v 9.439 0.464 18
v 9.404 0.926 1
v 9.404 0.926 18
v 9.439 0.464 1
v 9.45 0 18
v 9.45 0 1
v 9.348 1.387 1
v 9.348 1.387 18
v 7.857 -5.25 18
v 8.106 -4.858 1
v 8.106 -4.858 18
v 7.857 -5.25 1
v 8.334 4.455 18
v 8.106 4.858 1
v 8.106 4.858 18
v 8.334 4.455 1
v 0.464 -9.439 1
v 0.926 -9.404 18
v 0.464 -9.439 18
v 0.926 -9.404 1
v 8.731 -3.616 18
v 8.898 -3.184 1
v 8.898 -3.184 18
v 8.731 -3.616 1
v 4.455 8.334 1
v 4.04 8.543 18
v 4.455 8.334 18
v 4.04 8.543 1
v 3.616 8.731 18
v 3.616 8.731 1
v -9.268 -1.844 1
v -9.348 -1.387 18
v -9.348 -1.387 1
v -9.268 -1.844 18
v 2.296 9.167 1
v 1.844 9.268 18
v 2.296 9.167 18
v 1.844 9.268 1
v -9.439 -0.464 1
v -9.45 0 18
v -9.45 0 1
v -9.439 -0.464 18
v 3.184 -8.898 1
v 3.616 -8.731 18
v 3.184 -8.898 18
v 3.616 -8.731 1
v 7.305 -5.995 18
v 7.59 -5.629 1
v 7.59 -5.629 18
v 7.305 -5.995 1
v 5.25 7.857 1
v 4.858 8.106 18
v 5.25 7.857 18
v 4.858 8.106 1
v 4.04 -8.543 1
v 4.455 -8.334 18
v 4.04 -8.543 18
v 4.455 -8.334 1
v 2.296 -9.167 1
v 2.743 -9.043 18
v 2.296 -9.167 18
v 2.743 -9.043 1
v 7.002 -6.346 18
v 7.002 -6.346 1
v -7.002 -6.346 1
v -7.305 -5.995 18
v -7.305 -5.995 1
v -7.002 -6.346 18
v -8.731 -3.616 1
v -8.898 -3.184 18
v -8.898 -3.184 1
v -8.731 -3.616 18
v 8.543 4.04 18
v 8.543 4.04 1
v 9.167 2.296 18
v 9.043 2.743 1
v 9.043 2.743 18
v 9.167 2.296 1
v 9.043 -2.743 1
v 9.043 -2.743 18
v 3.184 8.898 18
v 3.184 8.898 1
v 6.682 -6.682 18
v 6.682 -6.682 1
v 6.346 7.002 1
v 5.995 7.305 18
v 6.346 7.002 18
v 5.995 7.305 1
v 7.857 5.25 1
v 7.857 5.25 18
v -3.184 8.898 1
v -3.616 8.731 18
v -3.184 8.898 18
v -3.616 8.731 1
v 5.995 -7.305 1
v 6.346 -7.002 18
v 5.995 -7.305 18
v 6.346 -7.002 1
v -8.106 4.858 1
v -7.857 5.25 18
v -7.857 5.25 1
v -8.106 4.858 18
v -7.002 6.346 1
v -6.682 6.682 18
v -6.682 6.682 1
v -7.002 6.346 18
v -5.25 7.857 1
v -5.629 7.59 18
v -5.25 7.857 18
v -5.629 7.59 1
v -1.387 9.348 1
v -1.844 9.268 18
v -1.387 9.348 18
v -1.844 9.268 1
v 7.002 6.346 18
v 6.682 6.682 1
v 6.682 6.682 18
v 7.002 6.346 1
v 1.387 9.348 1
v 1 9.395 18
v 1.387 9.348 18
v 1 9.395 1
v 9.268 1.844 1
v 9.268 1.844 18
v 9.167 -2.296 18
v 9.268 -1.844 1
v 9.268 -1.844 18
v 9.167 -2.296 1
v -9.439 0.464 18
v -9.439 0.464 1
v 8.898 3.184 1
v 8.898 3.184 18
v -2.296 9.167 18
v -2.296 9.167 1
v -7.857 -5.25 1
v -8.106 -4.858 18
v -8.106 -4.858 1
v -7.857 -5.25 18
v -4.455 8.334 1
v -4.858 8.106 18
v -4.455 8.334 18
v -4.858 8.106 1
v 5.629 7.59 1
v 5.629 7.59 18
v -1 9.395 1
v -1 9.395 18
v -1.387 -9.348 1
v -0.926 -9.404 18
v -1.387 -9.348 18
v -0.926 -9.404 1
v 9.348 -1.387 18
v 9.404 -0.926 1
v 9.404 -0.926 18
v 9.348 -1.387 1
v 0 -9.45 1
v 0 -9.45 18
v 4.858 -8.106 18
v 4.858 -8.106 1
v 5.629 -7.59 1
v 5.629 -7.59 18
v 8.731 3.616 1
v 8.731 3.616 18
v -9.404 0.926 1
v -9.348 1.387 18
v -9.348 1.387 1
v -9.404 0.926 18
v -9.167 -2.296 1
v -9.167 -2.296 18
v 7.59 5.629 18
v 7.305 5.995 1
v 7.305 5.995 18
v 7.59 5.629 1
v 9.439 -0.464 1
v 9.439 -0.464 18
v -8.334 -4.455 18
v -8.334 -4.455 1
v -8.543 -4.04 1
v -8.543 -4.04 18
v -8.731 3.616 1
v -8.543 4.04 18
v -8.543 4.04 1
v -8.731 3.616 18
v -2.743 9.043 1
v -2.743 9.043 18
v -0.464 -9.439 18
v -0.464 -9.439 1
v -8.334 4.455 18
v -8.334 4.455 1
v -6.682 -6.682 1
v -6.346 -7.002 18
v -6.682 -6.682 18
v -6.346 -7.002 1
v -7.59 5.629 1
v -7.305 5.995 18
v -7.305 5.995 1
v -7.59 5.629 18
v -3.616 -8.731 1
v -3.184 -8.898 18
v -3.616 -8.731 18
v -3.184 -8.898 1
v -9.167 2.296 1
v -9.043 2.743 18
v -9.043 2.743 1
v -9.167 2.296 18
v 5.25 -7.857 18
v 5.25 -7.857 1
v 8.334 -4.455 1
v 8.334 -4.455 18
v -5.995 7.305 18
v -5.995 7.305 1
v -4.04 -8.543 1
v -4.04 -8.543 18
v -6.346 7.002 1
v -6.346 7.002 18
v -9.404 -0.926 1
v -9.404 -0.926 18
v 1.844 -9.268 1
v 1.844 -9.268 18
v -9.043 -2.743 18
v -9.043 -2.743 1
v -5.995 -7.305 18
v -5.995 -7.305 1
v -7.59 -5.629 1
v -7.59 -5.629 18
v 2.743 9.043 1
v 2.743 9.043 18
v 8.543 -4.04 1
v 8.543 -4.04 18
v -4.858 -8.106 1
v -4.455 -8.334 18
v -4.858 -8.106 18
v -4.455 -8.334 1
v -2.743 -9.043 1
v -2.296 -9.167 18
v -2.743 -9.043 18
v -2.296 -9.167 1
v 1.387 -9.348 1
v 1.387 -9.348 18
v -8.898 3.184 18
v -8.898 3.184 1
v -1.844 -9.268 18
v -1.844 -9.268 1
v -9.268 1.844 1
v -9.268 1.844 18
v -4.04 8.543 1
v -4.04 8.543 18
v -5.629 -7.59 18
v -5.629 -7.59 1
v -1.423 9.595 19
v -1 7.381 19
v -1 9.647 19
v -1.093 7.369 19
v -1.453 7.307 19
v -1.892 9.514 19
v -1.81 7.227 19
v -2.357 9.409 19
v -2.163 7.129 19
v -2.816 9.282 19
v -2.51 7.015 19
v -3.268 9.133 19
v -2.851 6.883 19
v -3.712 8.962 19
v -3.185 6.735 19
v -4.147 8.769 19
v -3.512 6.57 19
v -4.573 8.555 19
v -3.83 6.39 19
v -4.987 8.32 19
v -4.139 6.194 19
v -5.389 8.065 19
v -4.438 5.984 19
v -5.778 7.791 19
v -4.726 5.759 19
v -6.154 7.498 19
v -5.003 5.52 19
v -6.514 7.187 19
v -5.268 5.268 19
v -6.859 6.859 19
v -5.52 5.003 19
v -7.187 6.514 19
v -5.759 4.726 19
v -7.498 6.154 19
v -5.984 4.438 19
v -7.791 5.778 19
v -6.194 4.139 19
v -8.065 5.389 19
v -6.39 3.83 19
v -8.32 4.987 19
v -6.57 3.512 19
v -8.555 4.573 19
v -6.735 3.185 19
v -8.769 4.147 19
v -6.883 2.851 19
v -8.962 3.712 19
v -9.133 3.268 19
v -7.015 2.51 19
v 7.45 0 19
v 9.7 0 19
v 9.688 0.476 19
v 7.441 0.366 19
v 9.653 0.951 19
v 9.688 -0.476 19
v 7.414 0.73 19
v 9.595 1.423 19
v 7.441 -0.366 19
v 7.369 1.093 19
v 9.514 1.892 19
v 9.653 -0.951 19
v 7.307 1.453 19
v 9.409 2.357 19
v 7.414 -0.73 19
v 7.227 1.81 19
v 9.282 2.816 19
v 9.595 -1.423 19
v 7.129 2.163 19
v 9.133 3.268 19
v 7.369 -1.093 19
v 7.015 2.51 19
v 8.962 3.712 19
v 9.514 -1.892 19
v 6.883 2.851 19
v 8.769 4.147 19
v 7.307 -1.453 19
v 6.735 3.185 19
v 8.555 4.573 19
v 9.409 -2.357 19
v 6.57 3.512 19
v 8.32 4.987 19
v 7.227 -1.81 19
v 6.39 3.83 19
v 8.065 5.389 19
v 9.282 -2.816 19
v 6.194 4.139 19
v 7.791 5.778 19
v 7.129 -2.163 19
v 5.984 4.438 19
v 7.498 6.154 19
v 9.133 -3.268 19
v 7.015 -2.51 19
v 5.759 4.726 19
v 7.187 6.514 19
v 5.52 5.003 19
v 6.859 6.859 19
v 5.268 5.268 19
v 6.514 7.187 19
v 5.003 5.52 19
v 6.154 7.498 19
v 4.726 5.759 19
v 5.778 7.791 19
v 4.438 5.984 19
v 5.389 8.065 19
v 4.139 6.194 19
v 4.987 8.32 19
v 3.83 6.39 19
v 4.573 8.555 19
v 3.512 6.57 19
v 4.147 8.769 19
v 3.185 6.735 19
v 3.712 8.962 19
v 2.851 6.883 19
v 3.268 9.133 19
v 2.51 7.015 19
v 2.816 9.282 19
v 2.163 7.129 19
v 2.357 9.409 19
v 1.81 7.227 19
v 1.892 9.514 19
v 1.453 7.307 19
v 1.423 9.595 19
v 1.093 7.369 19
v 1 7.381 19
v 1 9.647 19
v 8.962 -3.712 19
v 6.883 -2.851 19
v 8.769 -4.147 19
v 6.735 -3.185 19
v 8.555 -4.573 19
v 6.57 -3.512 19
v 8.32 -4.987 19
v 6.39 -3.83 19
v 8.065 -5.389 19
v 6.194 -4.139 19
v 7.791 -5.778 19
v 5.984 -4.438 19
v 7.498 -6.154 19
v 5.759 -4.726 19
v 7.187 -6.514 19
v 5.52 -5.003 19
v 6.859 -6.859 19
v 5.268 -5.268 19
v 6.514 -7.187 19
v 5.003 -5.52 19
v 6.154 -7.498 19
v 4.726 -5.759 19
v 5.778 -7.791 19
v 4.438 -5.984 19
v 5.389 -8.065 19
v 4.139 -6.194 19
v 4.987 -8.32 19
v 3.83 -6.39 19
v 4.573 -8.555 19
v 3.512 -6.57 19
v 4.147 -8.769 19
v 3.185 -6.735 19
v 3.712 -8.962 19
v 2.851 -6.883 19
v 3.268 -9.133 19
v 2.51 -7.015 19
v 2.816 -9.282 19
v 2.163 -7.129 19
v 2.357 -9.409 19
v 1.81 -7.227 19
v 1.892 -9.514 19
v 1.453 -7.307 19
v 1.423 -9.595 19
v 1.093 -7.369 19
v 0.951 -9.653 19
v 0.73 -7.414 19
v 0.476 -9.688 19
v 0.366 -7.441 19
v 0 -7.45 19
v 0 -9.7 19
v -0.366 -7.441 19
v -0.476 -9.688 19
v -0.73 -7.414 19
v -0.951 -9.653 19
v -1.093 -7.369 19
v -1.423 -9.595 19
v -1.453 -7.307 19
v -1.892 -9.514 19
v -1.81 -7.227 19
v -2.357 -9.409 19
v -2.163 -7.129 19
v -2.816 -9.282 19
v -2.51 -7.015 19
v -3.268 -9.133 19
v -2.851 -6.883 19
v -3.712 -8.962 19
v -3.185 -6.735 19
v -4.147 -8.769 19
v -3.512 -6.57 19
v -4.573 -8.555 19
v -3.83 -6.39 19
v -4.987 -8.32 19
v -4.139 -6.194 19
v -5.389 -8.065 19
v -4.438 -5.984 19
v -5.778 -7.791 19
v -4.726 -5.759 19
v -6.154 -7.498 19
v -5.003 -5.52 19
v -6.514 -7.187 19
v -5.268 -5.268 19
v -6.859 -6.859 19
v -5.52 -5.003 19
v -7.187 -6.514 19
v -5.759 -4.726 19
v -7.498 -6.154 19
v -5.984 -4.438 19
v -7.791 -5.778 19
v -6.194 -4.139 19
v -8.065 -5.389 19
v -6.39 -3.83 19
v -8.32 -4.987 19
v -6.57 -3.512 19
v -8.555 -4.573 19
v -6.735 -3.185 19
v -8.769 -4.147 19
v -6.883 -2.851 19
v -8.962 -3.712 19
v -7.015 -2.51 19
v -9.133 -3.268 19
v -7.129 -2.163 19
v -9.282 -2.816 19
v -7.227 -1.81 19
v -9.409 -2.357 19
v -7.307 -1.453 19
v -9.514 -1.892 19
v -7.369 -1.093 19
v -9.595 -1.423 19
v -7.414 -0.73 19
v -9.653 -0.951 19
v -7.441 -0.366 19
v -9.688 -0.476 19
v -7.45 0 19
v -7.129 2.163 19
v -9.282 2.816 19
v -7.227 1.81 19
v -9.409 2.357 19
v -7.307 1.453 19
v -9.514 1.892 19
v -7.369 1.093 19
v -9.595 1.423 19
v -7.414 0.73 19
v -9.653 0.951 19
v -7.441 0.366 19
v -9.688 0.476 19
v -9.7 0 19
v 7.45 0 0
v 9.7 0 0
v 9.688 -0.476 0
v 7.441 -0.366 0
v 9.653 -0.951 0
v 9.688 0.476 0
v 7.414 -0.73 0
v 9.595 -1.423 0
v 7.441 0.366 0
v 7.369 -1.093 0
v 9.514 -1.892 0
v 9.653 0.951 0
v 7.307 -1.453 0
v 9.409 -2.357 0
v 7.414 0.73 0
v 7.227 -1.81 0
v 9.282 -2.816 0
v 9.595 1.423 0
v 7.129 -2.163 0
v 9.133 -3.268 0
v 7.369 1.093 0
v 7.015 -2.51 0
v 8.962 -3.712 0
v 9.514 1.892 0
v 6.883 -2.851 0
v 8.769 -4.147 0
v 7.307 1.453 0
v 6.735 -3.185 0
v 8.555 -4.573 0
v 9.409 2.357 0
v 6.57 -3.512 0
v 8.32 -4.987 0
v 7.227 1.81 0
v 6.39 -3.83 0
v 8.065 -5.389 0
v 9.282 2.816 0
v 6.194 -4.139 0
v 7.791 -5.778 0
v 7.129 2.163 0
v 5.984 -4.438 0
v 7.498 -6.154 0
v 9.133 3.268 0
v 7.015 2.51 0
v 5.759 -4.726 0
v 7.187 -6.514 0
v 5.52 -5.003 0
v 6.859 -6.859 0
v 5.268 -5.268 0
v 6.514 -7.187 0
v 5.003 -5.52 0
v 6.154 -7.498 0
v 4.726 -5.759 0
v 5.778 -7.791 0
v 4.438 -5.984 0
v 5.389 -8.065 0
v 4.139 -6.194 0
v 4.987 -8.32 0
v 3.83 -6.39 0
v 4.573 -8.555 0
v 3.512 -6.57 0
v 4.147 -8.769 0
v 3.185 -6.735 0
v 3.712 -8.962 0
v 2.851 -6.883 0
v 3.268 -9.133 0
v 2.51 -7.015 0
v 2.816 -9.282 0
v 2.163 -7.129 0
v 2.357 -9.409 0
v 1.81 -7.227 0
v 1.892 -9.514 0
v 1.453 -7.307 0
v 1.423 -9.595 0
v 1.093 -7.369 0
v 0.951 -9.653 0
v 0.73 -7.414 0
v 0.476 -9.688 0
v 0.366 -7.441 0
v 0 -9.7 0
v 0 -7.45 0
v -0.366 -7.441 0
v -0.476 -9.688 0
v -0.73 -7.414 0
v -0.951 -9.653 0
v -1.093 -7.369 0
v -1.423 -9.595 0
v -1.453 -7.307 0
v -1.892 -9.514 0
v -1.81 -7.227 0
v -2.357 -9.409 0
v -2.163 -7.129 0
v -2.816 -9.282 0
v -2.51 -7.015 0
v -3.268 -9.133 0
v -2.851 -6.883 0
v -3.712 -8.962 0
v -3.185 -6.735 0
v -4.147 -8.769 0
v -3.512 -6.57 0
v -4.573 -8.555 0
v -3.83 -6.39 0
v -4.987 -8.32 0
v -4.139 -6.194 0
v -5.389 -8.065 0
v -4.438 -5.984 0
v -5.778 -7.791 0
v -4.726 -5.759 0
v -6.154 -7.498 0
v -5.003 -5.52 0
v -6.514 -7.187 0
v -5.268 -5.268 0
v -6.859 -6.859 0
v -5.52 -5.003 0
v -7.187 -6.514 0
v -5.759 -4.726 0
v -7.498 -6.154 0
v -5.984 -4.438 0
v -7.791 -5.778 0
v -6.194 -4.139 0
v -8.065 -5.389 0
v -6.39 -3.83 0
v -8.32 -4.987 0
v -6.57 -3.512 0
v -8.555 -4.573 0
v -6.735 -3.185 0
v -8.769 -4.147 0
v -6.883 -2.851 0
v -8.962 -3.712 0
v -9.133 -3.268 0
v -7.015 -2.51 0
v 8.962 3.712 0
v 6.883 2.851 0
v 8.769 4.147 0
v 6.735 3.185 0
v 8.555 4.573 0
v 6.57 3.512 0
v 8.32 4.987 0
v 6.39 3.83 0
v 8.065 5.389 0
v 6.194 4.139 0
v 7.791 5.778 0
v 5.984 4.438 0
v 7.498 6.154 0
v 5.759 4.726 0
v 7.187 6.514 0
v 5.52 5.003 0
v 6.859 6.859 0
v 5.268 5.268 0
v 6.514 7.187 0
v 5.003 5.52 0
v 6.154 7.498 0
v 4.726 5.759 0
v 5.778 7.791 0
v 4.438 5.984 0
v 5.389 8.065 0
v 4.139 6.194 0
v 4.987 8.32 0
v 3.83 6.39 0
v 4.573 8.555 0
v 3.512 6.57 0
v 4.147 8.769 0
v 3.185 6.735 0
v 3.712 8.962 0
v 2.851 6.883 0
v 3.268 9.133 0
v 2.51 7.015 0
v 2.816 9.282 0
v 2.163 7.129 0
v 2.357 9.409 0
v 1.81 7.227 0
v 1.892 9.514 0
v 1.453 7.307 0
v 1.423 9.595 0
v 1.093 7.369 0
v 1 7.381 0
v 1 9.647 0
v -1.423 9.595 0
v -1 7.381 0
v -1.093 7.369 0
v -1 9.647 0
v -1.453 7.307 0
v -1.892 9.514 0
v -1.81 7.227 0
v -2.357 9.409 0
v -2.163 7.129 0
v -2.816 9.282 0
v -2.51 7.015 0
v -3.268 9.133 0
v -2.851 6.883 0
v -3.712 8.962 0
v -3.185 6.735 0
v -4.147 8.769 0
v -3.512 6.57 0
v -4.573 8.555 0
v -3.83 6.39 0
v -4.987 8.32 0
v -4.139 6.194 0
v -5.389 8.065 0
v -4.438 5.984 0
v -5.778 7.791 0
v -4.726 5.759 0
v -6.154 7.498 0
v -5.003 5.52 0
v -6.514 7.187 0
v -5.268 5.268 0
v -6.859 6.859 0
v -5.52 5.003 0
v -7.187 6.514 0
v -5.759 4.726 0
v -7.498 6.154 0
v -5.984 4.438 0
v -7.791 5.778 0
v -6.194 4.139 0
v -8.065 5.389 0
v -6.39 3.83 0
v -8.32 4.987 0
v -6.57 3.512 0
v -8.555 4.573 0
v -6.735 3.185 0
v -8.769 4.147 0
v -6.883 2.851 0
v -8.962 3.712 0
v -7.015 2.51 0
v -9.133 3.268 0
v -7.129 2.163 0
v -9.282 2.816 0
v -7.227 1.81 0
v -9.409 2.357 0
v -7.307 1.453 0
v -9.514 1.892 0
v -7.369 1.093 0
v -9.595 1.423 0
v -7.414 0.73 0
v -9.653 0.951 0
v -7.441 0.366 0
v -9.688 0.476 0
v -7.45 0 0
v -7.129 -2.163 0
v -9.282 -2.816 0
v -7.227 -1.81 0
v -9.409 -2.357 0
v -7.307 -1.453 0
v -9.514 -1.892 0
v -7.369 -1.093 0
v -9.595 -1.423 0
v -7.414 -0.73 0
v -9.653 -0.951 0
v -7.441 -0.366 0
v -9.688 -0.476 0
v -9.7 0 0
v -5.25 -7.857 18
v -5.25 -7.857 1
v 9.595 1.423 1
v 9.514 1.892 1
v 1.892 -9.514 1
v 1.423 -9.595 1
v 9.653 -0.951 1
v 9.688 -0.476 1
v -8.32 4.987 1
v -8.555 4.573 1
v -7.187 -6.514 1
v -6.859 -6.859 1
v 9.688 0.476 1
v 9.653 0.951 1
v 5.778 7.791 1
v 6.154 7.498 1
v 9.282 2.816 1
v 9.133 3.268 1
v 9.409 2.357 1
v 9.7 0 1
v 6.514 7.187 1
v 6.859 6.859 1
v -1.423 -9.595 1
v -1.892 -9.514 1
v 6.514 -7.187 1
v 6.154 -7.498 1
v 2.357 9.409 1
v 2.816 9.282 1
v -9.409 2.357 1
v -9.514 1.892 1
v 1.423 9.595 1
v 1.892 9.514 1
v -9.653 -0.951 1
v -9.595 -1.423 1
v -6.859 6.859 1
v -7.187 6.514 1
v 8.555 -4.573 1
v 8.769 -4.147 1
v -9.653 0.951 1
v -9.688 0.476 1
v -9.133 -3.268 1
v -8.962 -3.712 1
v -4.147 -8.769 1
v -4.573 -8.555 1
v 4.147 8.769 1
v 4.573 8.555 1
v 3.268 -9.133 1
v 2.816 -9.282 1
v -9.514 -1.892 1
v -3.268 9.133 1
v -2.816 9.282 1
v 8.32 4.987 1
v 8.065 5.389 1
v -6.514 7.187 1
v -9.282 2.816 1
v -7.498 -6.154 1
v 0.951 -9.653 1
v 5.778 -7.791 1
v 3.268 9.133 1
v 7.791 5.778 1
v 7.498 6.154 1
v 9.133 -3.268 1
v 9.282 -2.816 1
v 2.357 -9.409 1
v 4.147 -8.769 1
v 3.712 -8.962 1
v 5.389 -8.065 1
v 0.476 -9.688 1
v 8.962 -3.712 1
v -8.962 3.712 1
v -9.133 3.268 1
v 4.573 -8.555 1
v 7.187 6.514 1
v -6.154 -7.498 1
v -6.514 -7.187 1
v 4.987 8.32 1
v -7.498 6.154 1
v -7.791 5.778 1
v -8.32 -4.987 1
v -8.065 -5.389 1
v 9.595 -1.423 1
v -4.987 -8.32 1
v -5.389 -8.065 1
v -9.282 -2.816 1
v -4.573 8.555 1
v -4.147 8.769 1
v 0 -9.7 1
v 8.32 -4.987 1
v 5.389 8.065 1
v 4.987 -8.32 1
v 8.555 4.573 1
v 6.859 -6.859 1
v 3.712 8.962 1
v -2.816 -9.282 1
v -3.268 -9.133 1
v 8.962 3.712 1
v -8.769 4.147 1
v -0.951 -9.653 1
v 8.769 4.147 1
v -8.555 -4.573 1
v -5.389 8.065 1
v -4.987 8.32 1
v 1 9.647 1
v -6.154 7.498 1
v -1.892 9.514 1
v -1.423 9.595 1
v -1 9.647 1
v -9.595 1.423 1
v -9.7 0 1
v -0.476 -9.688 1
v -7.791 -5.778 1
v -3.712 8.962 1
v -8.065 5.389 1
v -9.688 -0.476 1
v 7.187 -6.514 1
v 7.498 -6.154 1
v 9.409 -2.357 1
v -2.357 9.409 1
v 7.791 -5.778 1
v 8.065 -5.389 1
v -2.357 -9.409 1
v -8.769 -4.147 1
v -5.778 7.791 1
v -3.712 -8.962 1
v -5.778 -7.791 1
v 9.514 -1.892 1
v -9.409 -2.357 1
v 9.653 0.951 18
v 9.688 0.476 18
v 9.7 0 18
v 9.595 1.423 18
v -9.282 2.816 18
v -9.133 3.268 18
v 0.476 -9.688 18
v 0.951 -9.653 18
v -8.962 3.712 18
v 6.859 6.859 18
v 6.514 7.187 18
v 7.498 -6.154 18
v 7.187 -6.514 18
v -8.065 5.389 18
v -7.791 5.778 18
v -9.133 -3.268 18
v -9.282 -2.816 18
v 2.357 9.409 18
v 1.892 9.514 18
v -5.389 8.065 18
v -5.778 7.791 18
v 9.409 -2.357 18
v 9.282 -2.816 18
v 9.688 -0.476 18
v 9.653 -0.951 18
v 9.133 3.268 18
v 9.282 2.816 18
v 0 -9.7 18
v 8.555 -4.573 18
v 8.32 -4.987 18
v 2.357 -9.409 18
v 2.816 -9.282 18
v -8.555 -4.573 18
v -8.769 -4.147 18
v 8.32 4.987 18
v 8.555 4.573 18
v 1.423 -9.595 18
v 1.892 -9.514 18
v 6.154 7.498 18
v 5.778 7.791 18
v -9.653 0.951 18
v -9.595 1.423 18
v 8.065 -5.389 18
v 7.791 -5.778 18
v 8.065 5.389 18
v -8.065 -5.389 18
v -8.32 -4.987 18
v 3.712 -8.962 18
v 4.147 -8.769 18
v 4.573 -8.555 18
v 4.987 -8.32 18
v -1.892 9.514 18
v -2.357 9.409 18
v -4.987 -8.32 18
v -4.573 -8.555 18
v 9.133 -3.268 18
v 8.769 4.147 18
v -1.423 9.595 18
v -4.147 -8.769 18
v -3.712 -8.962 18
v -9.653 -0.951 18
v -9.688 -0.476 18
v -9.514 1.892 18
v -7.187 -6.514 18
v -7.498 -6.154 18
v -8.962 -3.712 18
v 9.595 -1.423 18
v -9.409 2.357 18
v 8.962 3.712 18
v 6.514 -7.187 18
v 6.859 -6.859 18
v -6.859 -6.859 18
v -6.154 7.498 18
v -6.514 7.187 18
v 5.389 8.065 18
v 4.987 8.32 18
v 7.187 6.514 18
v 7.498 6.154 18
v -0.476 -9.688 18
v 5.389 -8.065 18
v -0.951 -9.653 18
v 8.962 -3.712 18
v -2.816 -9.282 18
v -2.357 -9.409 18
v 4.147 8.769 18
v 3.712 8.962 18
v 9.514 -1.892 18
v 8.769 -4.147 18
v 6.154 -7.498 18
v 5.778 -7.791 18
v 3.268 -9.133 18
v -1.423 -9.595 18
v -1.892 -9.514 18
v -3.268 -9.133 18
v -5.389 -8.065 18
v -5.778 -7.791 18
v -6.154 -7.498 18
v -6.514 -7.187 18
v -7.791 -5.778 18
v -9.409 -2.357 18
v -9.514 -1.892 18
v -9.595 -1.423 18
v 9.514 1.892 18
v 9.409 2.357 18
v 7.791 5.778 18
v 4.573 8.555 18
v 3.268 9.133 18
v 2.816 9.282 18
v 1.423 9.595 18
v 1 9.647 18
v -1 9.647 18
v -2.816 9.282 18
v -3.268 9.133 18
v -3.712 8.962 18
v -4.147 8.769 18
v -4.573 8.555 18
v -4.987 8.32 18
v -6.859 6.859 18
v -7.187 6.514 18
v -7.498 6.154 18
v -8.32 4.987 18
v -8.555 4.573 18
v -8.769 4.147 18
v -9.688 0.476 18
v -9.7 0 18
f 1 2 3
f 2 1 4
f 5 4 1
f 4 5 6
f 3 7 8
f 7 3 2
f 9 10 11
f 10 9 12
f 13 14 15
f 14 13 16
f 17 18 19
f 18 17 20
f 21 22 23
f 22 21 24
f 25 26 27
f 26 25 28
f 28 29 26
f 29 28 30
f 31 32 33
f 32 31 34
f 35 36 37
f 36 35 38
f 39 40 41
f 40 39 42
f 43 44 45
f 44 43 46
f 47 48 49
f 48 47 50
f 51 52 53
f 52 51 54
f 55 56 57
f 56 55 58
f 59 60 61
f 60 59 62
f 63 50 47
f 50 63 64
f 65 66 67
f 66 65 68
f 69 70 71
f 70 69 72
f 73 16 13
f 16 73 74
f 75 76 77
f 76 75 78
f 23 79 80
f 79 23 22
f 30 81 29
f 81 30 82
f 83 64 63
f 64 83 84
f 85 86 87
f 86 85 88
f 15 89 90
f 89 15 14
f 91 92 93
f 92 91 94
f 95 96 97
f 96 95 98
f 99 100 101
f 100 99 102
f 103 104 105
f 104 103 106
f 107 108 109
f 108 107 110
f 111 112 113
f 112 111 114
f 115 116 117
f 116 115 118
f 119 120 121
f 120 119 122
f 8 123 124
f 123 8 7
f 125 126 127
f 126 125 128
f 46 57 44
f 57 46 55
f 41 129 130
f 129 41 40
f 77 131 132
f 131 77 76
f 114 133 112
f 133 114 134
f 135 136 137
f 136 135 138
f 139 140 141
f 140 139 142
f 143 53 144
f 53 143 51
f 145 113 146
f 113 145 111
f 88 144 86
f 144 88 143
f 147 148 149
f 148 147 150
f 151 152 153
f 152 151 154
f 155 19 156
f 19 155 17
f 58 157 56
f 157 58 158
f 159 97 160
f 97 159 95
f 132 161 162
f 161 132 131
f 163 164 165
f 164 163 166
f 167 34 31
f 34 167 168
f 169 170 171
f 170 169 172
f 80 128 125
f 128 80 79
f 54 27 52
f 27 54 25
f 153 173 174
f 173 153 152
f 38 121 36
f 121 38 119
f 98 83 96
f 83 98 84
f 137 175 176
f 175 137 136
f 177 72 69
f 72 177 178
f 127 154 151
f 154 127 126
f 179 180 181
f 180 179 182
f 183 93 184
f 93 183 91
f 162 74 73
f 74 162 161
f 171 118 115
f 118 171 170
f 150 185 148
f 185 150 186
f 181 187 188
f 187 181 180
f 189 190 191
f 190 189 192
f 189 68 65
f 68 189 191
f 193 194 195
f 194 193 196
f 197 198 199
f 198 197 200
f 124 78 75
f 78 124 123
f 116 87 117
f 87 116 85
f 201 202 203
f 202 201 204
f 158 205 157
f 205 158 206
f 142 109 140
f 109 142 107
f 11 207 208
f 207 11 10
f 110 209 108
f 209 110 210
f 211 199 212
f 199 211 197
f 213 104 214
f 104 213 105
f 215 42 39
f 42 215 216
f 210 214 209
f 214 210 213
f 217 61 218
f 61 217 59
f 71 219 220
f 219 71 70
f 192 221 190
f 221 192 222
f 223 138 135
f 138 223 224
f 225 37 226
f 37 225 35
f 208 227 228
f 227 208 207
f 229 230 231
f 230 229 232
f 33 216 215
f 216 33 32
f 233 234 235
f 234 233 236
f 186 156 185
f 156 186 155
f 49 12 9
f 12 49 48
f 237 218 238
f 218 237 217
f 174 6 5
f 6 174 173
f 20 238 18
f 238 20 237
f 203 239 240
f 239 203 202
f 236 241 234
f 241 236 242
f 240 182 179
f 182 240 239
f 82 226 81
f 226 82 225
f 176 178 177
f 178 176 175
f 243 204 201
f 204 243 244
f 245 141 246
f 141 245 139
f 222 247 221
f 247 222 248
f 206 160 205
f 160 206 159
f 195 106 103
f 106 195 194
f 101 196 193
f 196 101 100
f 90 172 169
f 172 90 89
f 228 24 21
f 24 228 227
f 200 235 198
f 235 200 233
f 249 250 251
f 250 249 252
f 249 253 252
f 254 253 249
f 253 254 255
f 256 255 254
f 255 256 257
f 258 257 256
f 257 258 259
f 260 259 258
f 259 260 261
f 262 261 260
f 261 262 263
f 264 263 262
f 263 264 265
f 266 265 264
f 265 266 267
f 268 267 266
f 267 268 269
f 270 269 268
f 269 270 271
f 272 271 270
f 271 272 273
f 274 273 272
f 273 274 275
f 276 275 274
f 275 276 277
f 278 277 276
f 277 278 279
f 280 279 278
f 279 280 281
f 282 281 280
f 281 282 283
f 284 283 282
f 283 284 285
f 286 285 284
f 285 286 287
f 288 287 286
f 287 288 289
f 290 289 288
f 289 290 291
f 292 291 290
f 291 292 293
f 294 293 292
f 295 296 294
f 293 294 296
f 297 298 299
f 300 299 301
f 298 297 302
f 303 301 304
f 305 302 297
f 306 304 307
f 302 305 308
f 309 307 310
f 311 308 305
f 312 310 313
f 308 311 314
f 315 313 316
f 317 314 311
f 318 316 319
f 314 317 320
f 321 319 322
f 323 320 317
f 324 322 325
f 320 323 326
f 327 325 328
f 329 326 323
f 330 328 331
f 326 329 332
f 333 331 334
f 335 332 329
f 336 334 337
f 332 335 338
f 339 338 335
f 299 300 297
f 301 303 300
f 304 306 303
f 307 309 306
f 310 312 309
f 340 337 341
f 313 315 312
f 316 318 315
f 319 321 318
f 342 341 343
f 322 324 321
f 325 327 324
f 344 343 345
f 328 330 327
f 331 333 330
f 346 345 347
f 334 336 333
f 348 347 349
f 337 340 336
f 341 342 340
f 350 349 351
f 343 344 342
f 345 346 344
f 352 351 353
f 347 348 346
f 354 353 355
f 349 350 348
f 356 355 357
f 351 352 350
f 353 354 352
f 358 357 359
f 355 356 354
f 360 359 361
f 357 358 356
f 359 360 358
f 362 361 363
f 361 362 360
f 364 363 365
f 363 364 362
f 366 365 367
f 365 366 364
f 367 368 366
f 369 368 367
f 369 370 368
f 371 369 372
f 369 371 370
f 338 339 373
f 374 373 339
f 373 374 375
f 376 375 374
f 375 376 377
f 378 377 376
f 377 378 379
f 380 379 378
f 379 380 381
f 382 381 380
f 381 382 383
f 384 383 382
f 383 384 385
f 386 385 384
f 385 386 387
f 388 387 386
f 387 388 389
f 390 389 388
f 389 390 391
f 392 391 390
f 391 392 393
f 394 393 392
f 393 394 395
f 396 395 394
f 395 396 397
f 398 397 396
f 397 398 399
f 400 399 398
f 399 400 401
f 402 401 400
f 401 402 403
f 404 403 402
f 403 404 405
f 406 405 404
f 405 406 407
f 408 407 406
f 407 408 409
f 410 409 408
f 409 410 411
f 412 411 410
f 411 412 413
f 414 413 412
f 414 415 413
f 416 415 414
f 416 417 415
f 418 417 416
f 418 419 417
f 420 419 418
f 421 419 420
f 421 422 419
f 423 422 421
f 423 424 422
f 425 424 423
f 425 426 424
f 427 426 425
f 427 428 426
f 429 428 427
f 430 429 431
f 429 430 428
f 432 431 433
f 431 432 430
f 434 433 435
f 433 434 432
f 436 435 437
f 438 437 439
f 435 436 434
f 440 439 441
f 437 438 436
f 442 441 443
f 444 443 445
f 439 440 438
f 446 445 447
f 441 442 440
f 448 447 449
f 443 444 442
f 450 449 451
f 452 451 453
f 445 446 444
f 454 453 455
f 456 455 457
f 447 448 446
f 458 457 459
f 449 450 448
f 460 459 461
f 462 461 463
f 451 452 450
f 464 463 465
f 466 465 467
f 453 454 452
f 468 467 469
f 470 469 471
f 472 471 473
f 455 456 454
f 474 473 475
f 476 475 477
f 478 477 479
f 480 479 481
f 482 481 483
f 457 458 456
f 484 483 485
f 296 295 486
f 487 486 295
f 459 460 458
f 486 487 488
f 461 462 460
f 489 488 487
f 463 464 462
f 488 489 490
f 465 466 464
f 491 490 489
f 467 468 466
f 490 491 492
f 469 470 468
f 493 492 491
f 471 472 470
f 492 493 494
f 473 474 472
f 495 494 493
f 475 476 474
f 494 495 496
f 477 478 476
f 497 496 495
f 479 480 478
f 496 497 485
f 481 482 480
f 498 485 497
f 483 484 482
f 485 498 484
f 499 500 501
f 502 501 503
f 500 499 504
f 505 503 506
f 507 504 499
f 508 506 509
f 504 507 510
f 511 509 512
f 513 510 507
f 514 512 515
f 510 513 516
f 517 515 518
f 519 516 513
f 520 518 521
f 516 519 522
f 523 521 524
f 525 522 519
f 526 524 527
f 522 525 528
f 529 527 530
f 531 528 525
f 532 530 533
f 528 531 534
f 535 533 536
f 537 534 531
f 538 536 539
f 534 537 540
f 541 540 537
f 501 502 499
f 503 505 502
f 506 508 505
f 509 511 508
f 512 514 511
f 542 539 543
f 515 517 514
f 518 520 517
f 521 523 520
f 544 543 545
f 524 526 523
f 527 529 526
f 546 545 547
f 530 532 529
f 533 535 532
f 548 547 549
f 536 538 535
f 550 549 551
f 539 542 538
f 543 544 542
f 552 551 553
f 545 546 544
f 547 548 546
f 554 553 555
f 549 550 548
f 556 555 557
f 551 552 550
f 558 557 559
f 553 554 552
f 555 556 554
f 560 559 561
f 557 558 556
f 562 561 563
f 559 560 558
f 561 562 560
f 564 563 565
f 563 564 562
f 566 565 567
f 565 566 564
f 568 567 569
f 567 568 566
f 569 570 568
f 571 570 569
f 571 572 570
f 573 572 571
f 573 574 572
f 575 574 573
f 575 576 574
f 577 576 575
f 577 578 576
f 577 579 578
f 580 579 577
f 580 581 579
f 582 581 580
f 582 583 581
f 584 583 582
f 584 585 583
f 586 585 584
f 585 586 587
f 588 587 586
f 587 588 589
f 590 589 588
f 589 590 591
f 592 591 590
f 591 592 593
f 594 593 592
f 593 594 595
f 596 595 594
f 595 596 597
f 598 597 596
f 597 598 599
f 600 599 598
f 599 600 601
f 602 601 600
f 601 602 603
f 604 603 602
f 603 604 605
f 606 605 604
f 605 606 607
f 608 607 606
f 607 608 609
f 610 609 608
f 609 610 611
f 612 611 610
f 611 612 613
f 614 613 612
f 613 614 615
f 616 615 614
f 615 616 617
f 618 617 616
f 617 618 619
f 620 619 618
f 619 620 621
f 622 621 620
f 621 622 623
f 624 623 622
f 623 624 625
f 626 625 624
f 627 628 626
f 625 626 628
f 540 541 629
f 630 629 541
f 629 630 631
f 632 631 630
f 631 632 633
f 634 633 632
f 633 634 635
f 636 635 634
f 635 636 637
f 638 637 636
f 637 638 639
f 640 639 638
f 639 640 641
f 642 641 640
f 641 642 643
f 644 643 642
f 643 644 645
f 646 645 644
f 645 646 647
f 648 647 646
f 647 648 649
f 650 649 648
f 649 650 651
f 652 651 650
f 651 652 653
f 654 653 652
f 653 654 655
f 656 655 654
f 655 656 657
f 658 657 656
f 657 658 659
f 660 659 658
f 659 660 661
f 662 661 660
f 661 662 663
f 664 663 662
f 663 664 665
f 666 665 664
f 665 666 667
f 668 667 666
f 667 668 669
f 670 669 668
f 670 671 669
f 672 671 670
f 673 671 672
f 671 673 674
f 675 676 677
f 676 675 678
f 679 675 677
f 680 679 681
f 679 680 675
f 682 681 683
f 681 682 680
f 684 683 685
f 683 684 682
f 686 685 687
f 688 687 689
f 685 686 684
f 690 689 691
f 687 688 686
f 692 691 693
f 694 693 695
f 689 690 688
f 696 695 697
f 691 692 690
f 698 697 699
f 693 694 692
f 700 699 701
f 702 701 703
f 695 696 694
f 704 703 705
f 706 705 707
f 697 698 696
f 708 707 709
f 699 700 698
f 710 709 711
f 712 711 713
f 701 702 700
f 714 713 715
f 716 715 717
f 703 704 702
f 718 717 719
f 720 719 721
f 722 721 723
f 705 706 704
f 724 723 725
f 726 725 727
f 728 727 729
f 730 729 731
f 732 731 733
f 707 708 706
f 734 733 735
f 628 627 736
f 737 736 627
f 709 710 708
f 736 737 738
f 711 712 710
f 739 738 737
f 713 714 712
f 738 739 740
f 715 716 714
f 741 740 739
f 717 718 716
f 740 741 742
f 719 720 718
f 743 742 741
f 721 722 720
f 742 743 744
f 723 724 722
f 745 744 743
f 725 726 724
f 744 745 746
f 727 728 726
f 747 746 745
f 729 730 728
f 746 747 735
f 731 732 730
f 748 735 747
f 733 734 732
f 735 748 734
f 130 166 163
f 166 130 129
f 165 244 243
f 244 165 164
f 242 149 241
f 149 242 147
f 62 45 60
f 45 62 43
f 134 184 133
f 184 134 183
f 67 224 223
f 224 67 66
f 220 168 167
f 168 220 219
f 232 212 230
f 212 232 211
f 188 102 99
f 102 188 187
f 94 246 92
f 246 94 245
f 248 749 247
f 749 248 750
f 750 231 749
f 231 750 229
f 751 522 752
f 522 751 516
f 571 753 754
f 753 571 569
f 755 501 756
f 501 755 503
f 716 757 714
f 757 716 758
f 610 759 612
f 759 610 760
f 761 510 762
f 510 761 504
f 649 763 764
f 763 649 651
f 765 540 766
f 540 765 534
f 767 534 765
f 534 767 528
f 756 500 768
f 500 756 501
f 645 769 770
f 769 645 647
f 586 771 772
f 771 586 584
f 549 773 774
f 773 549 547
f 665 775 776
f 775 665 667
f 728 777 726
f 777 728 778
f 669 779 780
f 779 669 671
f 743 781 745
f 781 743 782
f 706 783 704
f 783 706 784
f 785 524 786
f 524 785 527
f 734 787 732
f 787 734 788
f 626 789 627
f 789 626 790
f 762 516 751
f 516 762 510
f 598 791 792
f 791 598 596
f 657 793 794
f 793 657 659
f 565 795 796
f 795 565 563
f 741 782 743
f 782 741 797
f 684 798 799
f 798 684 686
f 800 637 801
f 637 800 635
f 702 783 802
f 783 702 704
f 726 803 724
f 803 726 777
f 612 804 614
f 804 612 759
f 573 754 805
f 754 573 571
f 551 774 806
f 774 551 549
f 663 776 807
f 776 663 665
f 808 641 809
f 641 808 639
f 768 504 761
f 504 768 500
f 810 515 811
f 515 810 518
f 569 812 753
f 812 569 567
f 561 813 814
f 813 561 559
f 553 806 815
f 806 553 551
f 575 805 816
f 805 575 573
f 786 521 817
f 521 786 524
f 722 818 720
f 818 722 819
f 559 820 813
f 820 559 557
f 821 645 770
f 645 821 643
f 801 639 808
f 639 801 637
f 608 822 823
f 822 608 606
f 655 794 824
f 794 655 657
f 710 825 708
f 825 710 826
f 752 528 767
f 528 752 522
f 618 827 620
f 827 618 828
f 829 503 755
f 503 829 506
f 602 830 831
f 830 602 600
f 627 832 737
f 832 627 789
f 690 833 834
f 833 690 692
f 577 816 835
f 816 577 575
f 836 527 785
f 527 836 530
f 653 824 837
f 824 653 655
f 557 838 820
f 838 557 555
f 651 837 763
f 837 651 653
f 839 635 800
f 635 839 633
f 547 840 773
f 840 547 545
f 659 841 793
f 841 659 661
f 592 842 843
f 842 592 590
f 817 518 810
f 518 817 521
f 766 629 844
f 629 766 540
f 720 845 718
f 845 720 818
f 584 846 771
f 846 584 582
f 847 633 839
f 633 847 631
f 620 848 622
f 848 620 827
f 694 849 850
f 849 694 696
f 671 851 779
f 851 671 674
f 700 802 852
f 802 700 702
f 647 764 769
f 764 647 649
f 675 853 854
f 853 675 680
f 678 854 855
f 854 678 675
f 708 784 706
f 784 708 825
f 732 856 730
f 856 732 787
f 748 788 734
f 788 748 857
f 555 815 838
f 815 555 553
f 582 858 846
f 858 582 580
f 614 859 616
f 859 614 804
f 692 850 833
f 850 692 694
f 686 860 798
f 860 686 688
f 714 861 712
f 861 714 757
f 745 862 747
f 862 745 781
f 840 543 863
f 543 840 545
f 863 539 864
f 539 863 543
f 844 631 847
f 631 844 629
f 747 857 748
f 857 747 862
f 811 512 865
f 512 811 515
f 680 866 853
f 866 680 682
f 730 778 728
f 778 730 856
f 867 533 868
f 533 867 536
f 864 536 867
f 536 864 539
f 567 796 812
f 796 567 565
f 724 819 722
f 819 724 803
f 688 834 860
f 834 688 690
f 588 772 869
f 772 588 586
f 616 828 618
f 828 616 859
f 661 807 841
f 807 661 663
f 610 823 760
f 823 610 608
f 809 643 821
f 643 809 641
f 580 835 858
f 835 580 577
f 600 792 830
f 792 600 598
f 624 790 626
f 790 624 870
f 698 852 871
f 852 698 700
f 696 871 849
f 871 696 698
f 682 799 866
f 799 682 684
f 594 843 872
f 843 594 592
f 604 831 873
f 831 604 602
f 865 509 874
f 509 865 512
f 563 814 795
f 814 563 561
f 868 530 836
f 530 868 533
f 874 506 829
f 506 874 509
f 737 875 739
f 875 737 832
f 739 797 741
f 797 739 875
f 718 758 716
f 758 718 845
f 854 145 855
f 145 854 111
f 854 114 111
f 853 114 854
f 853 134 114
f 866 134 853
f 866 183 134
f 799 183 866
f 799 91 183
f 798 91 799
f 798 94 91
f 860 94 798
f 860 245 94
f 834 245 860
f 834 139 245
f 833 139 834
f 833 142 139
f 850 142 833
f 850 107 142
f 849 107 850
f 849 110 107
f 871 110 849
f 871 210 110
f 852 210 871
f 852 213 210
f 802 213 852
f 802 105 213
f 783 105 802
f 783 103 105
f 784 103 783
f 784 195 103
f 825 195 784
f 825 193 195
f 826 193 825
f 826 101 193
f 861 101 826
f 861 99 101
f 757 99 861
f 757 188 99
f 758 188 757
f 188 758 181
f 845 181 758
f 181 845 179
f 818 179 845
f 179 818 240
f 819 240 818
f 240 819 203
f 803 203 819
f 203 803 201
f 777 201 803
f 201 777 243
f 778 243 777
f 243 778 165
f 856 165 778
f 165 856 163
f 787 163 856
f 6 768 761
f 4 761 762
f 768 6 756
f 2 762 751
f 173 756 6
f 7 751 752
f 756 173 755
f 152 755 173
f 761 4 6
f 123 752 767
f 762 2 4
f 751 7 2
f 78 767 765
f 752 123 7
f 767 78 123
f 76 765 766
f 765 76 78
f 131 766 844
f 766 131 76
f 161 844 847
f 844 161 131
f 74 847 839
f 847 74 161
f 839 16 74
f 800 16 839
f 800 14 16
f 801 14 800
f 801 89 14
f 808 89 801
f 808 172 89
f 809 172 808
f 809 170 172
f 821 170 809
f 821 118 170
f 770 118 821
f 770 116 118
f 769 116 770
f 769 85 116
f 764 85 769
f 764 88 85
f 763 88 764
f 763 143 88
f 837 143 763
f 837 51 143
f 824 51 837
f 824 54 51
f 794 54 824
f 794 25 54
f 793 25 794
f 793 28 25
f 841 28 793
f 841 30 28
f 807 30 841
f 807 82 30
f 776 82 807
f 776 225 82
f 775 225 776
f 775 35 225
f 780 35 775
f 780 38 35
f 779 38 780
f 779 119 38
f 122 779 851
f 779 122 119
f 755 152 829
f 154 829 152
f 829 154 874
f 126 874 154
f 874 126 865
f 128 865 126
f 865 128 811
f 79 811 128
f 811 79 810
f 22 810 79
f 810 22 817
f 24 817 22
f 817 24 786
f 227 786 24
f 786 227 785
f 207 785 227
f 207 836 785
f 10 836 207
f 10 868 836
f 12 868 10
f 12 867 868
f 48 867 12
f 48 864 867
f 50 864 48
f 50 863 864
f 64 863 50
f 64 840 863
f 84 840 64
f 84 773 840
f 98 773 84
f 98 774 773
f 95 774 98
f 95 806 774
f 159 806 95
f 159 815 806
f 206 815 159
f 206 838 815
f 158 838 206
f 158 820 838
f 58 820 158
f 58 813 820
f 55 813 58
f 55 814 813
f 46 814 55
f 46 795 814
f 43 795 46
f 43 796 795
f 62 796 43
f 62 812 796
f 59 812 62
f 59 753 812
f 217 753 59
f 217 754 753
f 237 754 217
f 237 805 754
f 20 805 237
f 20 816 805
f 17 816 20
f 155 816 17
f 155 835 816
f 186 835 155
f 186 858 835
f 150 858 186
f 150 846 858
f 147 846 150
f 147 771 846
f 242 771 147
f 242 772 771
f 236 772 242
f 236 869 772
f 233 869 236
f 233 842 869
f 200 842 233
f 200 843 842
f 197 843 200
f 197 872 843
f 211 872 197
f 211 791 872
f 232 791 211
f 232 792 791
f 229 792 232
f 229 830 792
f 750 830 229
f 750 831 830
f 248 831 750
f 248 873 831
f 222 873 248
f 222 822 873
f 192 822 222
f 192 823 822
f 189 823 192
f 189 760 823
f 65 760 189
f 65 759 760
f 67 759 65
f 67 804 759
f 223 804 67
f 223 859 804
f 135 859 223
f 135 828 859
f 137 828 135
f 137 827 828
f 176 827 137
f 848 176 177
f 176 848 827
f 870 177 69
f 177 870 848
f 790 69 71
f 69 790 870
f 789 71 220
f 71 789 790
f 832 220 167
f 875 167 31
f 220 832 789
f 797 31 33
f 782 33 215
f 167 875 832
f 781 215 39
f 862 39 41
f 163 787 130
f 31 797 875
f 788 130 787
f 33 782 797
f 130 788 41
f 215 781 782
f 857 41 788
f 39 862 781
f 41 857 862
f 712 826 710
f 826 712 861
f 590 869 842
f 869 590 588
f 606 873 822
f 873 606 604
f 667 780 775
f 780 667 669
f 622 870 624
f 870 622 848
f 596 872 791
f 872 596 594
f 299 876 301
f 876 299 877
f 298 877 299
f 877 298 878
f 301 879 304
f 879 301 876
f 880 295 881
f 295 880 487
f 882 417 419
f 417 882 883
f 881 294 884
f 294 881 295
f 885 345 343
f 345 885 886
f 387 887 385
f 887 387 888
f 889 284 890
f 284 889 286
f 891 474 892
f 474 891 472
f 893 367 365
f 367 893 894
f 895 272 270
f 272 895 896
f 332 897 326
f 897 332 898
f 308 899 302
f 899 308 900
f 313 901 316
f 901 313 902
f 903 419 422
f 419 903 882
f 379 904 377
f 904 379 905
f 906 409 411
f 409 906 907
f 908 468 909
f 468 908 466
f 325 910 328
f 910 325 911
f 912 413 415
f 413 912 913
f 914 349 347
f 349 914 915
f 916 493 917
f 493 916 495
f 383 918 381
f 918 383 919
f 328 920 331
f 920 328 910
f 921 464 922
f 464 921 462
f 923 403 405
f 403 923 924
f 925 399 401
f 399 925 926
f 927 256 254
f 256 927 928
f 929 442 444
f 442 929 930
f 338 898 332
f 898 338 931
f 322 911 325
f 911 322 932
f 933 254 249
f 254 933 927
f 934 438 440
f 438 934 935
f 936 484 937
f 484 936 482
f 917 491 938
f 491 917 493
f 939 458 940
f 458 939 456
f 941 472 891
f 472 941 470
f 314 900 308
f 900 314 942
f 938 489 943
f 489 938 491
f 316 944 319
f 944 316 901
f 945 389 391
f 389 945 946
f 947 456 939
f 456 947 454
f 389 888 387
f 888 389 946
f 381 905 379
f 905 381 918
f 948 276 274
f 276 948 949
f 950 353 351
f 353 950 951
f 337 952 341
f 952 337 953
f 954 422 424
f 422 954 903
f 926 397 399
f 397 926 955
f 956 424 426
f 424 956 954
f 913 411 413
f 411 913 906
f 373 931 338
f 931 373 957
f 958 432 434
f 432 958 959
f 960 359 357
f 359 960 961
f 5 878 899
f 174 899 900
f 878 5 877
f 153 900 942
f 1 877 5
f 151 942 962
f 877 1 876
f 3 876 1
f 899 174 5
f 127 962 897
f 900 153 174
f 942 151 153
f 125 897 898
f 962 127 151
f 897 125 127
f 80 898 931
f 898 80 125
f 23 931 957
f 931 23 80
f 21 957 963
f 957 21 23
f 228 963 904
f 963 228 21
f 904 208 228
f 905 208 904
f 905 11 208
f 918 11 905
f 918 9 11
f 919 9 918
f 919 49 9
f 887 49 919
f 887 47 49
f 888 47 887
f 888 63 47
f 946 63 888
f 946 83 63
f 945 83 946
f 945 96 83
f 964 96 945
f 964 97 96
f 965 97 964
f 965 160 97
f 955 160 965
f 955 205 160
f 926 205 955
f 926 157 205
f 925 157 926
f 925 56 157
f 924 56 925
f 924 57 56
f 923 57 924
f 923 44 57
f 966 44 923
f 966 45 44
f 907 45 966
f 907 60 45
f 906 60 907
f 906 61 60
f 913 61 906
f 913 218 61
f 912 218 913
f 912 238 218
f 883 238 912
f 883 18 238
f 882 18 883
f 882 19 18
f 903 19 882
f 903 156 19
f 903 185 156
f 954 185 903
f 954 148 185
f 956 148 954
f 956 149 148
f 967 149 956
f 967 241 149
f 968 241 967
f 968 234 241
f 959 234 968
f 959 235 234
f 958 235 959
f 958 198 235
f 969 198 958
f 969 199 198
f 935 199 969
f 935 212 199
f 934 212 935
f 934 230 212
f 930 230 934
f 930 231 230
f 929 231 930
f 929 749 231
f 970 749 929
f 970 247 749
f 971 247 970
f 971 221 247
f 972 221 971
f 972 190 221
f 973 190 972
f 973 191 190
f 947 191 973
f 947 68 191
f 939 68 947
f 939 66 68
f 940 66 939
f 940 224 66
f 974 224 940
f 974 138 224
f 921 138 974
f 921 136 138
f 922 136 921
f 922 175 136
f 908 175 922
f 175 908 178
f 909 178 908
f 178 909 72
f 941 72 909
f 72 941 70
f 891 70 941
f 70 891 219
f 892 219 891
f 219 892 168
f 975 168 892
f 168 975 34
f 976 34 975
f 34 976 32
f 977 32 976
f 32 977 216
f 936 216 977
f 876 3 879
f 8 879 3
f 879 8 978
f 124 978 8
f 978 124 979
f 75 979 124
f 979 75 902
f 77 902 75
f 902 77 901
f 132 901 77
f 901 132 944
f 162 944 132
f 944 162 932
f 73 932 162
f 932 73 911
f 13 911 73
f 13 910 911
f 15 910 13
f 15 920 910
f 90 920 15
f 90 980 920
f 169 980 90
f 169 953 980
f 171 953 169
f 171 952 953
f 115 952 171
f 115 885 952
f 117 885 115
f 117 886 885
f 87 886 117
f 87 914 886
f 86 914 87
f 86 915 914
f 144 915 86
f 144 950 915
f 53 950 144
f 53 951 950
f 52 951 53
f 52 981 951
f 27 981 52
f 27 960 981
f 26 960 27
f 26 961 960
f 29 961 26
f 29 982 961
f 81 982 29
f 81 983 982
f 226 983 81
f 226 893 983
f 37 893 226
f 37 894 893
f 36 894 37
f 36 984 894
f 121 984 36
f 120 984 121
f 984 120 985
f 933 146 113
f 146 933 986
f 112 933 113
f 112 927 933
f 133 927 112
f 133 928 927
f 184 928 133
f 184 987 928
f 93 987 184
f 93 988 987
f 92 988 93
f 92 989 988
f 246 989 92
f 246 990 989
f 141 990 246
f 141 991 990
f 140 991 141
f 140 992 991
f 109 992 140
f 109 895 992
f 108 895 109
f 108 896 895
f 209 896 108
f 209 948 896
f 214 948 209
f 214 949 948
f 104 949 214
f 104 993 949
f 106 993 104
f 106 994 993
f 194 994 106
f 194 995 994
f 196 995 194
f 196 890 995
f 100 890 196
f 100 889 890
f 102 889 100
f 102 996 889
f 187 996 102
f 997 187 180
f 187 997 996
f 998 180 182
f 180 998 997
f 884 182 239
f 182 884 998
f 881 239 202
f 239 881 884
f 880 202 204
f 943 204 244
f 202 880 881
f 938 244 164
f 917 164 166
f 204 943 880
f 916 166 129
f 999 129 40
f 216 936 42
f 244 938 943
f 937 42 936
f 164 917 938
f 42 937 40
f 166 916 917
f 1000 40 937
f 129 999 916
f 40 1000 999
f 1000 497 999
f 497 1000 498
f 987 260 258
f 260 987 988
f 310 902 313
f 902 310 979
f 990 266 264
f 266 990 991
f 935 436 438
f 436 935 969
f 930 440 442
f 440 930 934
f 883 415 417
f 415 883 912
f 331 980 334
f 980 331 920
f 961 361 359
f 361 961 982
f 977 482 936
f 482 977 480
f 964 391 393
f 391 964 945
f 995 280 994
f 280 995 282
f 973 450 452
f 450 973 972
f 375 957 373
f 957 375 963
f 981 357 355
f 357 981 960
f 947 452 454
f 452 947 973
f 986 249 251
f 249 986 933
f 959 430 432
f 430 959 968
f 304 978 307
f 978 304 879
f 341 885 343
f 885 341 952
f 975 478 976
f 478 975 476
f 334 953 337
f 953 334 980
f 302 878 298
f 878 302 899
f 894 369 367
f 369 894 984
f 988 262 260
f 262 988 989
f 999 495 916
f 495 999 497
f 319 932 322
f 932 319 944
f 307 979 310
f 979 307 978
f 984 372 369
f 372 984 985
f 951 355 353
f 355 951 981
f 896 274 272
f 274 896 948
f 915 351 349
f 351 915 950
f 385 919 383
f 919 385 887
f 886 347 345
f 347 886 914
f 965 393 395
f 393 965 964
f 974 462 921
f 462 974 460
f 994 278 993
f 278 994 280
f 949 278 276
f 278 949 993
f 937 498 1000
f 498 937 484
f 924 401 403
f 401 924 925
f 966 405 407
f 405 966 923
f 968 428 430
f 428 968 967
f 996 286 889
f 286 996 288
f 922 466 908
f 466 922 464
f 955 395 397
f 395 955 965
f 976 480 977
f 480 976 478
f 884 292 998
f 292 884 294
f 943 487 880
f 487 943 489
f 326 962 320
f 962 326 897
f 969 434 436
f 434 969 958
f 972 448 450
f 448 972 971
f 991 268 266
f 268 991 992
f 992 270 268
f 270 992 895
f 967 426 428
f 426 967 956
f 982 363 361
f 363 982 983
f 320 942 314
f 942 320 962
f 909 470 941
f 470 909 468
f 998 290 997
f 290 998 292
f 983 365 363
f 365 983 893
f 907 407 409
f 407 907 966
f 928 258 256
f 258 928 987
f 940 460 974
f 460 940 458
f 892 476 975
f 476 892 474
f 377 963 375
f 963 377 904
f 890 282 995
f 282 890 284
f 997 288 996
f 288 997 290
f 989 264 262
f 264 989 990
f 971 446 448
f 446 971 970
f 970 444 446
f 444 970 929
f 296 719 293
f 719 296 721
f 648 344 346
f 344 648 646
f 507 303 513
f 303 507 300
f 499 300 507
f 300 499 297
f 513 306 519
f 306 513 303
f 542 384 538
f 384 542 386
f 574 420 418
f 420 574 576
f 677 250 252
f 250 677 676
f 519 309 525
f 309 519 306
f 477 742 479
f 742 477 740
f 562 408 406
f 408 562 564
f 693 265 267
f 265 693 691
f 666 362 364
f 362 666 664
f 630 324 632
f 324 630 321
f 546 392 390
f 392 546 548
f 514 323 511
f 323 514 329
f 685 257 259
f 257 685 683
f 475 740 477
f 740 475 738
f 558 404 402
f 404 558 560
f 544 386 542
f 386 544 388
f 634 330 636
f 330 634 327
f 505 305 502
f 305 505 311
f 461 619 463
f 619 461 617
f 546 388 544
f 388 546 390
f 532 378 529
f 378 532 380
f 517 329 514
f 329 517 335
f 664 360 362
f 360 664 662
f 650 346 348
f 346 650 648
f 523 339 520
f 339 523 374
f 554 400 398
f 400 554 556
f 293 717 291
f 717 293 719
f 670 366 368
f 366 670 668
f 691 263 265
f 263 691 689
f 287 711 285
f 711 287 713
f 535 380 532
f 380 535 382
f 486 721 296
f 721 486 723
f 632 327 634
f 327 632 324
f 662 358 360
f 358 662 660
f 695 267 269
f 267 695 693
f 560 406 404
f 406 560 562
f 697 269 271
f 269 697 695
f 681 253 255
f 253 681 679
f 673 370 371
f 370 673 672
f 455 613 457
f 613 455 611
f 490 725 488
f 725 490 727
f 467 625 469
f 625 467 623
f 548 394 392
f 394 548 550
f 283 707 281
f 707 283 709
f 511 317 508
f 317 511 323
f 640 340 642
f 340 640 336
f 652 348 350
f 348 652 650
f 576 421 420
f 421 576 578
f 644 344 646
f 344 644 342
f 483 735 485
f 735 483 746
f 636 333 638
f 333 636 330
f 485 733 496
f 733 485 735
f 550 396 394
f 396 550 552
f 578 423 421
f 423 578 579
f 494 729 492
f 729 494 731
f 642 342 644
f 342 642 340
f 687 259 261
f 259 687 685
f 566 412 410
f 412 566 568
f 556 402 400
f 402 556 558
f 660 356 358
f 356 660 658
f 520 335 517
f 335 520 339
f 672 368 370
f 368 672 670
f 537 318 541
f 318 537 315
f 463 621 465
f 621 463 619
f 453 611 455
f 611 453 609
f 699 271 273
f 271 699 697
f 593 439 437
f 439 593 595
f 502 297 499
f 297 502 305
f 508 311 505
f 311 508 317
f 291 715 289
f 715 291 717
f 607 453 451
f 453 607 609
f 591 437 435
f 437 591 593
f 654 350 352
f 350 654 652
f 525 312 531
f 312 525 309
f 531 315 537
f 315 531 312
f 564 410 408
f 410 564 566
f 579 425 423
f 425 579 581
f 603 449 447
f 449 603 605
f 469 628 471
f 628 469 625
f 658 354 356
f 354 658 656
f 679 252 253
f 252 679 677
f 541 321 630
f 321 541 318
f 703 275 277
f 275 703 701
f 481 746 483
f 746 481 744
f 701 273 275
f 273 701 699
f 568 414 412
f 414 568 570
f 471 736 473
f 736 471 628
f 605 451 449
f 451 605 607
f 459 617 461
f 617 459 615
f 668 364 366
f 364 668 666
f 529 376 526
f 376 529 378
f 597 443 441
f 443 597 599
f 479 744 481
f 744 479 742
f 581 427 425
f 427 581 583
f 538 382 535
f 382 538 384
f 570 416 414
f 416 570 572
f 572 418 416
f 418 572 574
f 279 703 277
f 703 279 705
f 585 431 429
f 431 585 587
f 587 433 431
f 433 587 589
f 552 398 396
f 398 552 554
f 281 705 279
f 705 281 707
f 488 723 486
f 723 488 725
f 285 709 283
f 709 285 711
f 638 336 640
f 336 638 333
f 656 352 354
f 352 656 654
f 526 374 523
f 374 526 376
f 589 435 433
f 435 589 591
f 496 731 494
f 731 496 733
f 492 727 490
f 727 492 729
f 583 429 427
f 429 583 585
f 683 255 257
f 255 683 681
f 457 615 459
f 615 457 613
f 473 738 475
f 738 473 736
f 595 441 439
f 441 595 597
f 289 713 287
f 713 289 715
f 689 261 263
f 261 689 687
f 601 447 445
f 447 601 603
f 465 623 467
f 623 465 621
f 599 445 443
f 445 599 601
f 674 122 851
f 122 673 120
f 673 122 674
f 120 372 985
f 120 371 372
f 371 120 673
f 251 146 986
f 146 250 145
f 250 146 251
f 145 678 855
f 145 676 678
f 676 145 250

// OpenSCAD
// Tighter insert for mounting follow-focus
// Project: poor man's Trinity
$fn=128;
difference() {
  union() {
    cylinder(d=18.9,h=19);
    cylinder(d=19.4,h=1);
    translate([0,0,18])cylinder(d=19.4,h=1);
  }
    translate([0,0,-0.1])cylinder(d=14.9,h=19.2);
    translate([-1,0,-0.1])cube([2,10,20]);
}
